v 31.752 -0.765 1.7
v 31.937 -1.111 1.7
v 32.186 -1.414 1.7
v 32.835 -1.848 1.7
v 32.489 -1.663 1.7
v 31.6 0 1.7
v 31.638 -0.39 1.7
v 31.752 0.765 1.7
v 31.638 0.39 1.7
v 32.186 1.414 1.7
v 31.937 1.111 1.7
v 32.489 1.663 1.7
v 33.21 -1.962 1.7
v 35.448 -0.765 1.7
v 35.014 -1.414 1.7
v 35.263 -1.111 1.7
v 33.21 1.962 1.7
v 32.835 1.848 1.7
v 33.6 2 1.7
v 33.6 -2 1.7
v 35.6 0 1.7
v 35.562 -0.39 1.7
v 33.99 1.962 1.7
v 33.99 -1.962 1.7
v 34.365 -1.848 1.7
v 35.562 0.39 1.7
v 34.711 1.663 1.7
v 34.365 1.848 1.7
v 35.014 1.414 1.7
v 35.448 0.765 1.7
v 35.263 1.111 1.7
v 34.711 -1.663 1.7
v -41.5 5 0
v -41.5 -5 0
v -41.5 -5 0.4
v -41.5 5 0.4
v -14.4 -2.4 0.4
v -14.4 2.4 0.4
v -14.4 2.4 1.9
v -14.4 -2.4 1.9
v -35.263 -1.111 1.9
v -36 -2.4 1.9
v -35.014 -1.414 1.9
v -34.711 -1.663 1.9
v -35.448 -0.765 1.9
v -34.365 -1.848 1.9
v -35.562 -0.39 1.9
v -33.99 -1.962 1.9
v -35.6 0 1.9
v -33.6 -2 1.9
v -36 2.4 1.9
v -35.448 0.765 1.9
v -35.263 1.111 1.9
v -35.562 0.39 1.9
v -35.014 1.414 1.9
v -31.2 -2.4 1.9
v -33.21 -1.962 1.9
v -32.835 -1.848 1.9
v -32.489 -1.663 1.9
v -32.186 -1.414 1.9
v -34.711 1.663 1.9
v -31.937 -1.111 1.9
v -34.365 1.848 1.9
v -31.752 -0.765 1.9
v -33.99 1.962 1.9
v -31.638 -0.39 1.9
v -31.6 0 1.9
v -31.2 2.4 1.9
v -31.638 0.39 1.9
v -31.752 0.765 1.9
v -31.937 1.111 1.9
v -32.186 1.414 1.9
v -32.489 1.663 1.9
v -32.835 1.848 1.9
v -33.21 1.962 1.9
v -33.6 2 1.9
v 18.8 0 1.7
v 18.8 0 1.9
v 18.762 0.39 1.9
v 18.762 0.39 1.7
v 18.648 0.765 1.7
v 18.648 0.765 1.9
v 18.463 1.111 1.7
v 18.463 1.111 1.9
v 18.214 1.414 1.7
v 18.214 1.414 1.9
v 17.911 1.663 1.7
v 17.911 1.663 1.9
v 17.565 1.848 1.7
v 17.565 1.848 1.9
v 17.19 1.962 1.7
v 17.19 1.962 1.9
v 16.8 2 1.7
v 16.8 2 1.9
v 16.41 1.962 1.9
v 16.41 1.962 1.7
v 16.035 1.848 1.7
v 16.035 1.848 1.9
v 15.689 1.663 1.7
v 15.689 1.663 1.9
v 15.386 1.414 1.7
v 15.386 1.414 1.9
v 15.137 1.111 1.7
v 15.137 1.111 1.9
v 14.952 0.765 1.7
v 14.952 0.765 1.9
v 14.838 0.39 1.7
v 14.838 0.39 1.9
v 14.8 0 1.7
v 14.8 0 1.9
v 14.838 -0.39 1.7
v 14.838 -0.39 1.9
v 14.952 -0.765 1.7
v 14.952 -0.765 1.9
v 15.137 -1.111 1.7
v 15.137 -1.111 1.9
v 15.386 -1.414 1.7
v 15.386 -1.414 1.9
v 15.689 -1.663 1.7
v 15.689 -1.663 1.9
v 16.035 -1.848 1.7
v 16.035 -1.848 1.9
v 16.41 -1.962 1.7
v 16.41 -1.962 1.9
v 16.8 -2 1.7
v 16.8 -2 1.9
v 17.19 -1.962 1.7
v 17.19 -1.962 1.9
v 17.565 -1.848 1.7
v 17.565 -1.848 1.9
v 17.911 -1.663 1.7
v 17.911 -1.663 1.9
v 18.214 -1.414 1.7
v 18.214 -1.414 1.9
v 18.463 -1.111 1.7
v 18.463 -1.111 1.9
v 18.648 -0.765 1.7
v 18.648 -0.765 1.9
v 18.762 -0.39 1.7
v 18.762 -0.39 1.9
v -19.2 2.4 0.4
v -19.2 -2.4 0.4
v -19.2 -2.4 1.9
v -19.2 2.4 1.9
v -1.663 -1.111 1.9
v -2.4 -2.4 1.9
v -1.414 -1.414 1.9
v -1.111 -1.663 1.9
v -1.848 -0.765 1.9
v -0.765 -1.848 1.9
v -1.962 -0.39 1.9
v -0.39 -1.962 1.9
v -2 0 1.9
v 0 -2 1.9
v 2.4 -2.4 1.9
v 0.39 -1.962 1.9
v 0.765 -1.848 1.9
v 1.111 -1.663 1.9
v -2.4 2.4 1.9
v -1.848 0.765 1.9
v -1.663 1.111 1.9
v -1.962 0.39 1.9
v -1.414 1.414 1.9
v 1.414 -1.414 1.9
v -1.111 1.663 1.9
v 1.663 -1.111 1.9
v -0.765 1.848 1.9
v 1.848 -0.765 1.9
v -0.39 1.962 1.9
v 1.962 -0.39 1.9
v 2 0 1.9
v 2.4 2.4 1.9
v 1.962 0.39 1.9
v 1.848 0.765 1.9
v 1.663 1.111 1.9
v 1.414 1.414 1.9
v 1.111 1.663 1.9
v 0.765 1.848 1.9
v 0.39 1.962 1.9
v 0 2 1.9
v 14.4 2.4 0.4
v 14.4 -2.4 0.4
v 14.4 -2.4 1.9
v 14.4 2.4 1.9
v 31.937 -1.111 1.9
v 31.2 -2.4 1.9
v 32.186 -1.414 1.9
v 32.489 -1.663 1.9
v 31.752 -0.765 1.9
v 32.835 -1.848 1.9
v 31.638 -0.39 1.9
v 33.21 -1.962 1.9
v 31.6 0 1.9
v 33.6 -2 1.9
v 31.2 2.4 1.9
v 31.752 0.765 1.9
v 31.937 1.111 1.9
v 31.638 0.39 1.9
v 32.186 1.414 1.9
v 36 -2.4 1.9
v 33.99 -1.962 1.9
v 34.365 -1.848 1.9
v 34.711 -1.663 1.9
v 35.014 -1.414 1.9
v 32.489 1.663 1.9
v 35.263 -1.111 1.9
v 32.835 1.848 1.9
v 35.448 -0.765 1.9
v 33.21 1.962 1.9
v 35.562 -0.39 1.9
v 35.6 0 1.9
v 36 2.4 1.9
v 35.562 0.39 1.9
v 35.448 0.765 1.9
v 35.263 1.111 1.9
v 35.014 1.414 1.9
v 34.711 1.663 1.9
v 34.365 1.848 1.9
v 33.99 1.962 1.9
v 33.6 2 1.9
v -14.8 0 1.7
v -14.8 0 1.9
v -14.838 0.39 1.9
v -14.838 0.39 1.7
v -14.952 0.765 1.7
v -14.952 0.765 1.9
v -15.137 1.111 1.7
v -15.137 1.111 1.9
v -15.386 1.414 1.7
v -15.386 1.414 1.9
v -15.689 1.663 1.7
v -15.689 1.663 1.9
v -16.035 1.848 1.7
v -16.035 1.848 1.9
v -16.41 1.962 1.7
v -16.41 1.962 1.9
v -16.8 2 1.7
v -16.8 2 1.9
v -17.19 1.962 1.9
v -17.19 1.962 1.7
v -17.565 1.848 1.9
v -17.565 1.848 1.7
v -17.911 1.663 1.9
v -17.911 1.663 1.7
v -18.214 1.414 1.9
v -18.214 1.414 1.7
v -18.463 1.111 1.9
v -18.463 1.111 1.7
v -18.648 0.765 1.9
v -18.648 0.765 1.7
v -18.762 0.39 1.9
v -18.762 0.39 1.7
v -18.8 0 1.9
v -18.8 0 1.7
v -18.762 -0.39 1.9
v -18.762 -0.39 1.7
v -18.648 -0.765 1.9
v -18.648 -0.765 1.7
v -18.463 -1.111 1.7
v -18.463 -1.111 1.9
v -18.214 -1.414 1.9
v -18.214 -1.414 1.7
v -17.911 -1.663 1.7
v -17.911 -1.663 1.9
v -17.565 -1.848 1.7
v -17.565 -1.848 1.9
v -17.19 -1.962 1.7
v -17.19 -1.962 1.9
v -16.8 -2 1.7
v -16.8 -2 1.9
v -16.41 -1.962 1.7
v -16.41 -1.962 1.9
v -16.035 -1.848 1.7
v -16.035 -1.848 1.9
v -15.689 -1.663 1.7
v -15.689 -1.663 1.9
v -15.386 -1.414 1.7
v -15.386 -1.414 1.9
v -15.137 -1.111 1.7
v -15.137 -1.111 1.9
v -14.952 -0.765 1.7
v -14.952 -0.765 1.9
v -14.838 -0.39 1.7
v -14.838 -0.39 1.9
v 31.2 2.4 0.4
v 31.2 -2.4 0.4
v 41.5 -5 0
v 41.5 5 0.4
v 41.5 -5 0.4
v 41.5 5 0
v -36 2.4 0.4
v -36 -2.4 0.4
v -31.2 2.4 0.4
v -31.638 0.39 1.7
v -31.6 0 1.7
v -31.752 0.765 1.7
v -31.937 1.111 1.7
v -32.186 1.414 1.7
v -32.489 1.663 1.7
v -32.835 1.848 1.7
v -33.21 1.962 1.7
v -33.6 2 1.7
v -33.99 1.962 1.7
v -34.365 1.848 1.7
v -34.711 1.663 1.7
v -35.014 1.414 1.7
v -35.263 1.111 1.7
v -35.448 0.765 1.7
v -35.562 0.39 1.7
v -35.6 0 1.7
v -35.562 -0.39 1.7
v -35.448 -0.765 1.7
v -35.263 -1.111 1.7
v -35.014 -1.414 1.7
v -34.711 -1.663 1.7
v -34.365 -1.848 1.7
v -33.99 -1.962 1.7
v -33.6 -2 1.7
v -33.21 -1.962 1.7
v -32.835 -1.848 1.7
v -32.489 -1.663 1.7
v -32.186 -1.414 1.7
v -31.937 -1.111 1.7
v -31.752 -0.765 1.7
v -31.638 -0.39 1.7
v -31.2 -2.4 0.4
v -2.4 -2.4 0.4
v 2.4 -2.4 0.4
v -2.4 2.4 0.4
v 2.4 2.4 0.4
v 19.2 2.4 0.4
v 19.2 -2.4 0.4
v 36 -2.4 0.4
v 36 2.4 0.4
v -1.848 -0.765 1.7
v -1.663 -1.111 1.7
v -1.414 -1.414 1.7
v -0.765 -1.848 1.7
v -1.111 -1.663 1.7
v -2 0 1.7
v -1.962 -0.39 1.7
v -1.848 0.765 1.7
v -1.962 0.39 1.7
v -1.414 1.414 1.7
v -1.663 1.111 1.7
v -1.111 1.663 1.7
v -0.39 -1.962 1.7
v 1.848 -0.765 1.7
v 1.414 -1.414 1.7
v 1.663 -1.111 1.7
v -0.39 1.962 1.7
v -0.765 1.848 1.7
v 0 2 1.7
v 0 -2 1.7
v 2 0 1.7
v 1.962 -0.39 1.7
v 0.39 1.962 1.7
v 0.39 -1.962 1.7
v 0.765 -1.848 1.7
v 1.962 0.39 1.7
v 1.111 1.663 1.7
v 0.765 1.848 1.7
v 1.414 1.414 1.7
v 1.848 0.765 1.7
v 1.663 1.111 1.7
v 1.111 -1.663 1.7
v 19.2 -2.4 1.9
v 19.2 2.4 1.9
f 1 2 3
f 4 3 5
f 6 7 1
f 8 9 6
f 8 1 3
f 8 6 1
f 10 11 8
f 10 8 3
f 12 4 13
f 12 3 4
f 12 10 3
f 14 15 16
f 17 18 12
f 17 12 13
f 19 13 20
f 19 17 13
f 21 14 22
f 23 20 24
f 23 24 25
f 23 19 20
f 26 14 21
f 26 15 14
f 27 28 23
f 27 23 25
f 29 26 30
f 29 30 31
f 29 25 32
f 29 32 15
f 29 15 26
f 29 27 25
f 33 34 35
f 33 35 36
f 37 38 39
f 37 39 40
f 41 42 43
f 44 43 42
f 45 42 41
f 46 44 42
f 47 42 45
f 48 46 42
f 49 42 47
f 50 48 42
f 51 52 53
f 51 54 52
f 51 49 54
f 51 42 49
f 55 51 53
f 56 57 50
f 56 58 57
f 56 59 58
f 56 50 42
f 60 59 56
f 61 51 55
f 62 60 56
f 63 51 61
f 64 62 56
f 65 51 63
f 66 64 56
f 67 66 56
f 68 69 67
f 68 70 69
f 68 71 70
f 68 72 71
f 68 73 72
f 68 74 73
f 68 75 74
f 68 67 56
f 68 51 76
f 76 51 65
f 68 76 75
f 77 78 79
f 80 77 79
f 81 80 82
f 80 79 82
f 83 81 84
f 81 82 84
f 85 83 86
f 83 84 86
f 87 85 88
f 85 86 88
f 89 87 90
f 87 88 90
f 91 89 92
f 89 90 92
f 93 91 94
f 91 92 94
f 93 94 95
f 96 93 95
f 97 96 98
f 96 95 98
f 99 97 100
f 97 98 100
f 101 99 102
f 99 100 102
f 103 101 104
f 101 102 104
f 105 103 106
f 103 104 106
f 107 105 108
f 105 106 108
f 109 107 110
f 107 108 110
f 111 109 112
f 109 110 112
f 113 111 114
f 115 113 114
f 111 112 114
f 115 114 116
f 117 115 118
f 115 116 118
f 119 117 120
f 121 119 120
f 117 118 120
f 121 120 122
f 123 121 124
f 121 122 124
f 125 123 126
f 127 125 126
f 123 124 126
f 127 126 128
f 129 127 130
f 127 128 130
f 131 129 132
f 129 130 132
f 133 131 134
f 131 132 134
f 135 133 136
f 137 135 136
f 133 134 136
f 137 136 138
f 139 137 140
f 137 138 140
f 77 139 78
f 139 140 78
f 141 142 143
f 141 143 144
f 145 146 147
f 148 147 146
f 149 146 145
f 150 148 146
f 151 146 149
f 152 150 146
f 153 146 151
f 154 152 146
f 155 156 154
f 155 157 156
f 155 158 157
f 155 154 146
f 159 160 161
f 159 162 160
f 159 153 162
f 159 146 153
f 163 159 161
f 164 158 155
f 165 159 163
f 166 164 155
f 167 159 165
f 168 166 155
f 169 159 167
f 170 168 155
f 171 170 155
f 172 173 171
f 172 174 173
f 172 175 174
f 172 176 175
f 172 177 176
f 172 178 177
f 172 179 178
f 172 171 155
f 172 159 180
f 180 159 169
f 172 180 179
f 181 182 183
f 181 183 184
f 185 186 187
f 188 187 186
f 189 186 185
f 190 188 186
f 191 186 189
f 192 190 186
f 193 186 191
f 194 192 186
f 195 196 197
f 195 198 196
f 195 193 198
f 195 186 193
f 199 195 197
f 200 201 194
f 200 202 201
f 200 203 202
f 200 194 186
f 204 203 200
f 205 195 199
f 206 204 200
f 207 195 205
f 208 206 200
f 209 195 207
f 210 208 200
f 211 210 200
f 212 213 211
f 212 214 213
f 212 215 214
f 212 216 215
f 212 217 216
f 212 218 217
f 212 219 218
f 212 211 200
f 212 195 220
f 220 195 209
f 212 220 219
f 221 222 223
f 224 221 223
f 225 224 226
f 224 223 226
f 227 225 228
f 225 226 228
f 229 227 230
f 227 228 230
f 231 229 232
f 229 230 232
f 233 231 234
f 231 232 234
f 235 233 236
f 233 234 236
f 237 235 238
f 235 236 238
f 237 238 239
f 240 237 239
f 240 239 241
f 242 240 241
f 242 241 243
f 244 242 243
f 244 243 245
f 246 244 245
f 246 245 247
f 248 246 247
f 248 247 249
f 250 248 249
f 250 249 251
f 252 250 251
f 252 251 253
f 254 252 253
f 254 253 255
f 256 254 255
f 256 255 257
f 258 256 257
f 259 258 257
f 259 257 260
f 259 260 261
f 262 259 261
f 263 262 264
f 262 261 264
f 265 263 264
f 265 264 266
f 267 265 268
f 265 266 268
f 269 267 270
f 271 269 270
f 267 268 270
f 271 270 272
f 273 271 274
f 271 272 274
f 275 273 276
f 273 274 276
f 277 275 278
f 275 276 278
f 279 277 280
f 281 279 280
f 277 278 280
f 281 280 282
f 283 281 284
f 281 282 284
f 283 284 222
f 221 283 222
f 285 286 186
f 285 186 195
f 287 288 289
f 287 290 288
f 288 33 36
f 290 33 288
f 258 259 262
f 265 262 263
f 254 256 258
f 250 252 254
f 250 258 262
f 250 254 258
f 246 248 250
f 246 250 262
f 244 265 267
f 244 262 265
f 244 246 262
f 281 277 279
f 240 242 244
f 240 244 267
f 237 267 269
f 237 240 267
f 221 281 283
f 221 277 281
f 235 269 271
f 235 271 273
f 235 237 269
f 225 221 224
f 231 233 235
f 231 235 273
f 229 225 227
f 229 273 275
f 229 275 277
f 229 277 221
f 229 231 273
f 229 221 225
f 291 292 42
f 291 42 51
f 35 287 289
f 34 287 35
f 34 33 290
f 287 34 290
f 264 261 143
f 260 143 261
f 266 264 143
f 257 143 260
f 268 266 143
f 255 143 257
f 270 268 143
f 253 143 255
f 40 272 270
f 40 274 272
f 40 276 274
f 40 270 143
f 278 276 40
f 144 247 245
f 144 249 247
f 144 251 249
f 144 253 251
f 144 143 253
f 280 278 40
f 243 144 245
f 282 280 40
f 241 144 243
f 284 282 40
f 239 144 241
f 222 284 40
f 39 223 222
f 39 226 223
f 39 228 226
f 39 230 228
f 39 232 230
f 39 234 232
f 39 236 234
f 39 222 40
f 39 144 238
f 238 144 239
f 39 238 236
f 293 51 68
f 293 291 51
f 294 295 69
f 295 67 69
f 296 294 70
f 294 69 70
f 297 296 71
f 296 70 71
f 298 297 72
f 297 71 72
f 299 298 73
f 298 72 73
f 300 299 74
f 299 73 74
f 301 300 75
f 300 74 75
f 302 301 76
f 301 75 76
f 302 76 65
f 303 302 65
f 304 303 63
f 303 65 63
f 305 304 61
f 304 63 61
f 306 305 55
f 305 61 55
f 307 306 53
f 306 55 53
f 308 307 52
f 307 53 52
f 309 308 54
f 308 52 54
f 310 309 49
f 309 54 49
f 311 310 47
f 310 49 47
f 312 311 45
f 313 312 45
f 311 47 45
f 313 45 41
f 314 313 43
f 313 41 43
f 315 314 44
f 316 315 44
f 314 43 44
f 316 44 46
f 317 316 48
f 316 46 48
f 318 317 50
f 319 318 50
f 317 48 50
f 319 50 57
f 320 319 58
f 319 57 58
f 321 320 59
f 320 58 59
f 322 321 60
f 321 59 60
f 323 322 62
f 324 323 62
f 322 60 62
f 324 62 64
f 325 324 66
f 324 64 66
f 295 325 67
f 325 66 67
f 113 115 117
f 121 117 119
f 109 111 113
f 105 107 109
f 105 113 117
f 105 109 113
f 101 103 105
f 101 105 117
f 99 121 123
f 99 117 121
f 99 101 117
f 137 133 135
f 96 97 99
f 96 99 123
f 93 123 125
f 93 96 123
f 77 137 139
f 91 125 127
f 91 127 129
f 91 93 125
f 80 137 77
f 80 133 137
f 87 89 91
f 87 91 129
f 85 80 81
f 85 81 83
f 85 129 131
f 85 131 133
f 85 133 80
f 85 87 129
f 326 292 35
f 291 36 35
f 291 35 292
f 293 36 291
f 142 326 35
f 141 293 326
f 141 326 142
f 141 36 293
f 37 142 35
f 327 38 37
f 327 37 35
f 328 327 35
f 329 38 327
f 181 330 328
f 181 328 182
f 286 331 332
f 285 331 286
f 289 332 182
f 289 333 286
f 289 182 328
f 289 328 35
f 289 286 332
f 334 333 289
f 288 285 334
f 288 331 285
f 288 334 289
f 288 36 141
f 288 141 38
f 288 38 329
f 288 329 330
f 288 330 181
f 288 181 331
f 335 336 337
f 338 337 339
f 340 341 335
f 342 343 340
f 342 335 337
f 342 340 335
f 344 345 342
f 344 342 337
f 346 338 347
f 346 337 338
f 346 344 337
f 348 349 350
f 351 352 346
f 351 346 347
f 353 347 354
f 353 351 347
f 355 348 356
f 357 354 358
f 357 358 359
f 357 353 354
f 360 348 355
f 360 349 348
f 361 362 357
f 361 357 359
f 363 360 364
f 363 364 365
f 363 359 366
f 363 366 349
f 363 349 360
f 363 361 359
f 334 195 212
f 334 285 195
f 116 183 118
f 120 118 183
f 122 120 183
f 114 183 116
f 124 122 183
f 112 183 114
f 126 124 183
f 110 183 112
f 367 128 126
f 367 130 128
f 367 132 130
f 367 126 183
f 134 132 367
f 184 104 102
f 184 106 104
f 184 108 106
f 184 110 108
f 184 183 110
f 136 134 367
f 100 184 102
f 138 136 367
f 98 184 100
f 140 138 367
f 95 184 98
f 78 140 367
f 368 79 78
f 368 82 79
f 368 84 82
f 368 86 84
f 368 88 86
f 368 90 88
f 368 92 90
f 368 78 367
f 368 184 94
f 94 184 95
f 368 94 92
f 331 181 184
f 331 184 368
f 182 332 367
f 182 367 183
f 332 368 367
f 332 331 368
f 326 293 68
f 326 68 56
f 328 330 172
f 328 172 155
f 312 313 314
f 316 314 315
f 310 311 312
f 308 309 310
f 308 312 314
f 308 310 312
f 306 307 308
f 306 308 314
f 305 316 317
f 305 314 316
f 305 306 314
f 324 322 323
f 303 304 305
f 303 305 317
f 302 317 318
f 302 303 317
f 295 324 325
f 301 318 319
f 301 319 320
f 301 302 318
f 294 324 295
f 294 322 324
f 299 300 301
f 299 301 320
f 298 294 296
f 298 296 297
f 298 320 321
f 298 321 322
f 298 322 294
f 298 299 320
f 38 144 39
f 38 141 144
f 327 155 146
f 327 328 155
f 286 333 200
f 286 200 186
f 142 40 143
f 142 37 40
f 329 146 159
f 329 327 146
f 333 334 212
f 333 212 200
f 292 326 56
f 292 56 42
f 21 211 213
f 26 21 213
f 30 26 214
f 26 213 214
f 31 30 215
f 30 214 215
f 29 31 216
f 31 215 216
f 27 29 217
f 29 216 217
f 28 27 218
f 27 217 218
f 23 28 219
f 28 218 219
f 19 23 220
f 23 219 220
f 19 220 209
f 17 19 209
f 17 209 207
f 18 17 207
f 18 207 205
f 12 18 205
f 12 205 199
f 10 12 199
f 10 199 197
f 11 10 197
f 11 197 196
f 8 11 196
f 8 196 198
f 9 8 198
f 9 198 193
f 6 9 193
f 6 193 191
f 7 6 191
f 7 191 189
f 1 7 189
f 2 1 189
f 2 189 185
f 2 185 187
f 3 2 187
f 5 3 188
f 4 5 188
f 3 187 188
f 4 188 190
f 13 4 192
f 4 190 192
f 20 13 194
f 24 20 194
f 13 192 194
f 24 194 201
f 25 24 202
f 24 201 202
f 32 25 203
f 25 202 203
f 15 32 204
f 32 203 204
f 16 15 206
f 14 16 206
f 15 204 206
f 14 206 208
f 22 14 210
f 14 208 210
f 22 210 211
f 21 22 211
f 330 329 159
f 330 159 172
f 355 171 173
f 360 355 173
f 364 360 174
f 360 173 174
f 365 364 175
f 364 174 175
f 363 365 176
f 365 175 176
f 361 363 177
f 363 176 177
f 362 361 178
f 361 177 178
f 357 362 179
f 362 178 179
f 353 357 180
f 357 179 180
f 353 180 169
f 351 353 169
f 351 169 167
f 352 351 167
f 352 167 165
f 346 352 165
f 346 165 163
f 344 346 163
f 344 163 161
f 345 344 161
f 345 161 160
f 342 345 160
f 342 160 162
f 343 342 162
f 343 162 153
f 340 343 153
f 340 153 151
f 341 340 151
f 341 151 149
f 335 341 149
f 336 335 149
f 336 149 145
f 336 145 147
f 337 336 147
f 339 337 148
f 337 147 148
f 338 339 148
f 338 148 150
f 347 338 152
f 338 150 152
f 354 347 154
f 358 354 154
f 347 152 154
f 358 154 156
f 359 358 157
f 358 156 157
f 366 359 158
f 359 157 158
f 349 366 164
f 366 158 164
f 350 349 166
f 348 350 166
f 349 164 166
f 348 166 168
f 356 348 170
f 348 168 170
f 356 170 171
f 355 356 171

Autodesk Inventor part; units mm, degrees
ref_plane "YZ Plane" through (0, 0, 0) normal (1, 0, 0) x (0, 1, 0)
ref_plane "XZ Plane" through (0, 0, 0) normal (0, 1, 0) x (-1, 0, 0)
ref_plane "XY Plane" through (0, 0, 0) normal (0, 0, 1) x (1, 0, 0)
sketch "Sketch1" plane through (0, 0, 0) normal (0, 0, 1) x (1, 0, 0)
  line L0 (-41.5, 5) -> (41.5, 5)
  line L1 (41.5, 5) -> (41.5, -5)
  line L2 (41.5, -5) -> (-41.5, -5)
  line L3 (-41.5, -5) -> (-41.5, 5)
  line L4 (-41.5, 5) -> (41.5, -5) construction
  line L5 (41.5, 5) -> (-41.5, -5) construction
  point P0 (0, 0)
  dimension "d0" = 83
  dimension "d1" = 10
extrude "Extrusion1" add sketch "Sketch1" along normal blind 0.4
sketch "Sketch2" plane through (0, 0, 0.4) normal (0, 0, 1) x (1, 0, 0)
  line L0 (31.2, 2.4) -> (36, 2.4)
  line L1 (36, 2.4) -> (36, -2.4)
  line L2 (36, -2.4) -> (31.2, -2.4)
  line L3 (31.2, -2.4) -> (31.2, 2.4)
  line L4 (31.2, 2.4) -> (36, -2.4) construction
  line L5 (36, 2.4) -> (31.2, -2.4) construction
  line L6 (-41.5, 5) -> (-41.5, -5) projected
  line L7 (41.5, -5) -> (41.5, 5) projected
  line L8 (14.4, 2.4) -> (19.2, 2.4)
  line L9 (19.2, 2.4) -> (19.2, -2.4)
  line L10 (19.2, -2.4) -> (14.4, -2.4)
  line L11 (14.4, -2.4) -> (14.4, 2.4)
  line L12 (14.4, 2.4) -> (19.2, -2.4) construction
  line L13 (19.2, 2.4) -> (14.4, -2.4) construction
  line L14 (-2.4, 2.4) -> (2.4, 2.4)
  line L15 (2.4, 2.4) -> (2.4, -2.4)
  line L16 (2.4, -2.4) -> (-2.4, -2.4)
  line L17 (-2.4, -2.4) -> (-2.4, 2.4)
  line L18 (-2.4, 2.4) -> (2.4, -2.4) construction
  line L19 (2.4, 2.4) -> (-2.4, -2.4) construction
  line L20 (-19.2, 2.4) -> (-14.4, 2.4)
  line L21 (-14.4, 2.4) -> (-14.4, -2.4)
  line L22 (-14.4, -2.4) -> (-19.2, -2.4)
  line L23 (-19.2, -2.4) -> (-19.2, 2.4)
  line L24 (-19.2, 2.4) -> (-14.4, -2.4) construction
  line L25 (-14.4, 2.4) -> (-19.2, -2.4) construction
  line L26 (-36, 2.4) -> (-31.2, 2.4)
  line L27 (-31.2, 2.4) -> (-31.2, -2.4)
  line L28 (-31.2, -2.4) -> (-36, -2.4)
  line L29 (-36, -2.4) -> (-36, 2.4)
  line L30 (-36, 2.4) -> (-31.2, -2.4) construction
  line L31 (-31.2, 2.4) -> (-36, -2.4) construction
  point P0 (0, 0)
  point P1 (33.6, 0)
  point P2 (33.6, 0)
  point P3 (-41.5, 0)
  point P4 (16.8, 0)
  point P5 (16.8, 0)
  point P6 (0, 0)
  point P7 (0, 0)
  point P8 (-16.8, 0)
  point P9 (-16.8, 0)
  point P10 (-33.6, 0)
  point P11 (-33.6, 0)
  dimension "d4" = 4.8
  dimension "d5" = 4.8
  dimension "d6" = 5.5
  dimension "d9" = 16.8
extrude "Extrusion2" add sketch "Sketch2" along normal blind 1.5
sketch "Sketch3" plane through (0, 0, 1.9) normal (0, 0, 1) x (1, 0, 0)
  circle A0 centre (33.6, 0) radius 2
  line L0 (36, -2.4) -> (36, 2.4) projected
  line L1 (36, 2.4) -> (31.2, 2.4) projected
  point P0 (0, 0)
  point P1 (36, 0)
  point P2 (33.6, 2.4)
  dimension "d16" = 4
extrude "Extrusion3" cut sketch "Sketch3" against normal blind 0.2
pattern_linear "Rectangular Pattern1" count 5 spacing 16.8 along (-1, 0, 0) of "Extrusion3"
properties part number "LEDStrip 5x"
